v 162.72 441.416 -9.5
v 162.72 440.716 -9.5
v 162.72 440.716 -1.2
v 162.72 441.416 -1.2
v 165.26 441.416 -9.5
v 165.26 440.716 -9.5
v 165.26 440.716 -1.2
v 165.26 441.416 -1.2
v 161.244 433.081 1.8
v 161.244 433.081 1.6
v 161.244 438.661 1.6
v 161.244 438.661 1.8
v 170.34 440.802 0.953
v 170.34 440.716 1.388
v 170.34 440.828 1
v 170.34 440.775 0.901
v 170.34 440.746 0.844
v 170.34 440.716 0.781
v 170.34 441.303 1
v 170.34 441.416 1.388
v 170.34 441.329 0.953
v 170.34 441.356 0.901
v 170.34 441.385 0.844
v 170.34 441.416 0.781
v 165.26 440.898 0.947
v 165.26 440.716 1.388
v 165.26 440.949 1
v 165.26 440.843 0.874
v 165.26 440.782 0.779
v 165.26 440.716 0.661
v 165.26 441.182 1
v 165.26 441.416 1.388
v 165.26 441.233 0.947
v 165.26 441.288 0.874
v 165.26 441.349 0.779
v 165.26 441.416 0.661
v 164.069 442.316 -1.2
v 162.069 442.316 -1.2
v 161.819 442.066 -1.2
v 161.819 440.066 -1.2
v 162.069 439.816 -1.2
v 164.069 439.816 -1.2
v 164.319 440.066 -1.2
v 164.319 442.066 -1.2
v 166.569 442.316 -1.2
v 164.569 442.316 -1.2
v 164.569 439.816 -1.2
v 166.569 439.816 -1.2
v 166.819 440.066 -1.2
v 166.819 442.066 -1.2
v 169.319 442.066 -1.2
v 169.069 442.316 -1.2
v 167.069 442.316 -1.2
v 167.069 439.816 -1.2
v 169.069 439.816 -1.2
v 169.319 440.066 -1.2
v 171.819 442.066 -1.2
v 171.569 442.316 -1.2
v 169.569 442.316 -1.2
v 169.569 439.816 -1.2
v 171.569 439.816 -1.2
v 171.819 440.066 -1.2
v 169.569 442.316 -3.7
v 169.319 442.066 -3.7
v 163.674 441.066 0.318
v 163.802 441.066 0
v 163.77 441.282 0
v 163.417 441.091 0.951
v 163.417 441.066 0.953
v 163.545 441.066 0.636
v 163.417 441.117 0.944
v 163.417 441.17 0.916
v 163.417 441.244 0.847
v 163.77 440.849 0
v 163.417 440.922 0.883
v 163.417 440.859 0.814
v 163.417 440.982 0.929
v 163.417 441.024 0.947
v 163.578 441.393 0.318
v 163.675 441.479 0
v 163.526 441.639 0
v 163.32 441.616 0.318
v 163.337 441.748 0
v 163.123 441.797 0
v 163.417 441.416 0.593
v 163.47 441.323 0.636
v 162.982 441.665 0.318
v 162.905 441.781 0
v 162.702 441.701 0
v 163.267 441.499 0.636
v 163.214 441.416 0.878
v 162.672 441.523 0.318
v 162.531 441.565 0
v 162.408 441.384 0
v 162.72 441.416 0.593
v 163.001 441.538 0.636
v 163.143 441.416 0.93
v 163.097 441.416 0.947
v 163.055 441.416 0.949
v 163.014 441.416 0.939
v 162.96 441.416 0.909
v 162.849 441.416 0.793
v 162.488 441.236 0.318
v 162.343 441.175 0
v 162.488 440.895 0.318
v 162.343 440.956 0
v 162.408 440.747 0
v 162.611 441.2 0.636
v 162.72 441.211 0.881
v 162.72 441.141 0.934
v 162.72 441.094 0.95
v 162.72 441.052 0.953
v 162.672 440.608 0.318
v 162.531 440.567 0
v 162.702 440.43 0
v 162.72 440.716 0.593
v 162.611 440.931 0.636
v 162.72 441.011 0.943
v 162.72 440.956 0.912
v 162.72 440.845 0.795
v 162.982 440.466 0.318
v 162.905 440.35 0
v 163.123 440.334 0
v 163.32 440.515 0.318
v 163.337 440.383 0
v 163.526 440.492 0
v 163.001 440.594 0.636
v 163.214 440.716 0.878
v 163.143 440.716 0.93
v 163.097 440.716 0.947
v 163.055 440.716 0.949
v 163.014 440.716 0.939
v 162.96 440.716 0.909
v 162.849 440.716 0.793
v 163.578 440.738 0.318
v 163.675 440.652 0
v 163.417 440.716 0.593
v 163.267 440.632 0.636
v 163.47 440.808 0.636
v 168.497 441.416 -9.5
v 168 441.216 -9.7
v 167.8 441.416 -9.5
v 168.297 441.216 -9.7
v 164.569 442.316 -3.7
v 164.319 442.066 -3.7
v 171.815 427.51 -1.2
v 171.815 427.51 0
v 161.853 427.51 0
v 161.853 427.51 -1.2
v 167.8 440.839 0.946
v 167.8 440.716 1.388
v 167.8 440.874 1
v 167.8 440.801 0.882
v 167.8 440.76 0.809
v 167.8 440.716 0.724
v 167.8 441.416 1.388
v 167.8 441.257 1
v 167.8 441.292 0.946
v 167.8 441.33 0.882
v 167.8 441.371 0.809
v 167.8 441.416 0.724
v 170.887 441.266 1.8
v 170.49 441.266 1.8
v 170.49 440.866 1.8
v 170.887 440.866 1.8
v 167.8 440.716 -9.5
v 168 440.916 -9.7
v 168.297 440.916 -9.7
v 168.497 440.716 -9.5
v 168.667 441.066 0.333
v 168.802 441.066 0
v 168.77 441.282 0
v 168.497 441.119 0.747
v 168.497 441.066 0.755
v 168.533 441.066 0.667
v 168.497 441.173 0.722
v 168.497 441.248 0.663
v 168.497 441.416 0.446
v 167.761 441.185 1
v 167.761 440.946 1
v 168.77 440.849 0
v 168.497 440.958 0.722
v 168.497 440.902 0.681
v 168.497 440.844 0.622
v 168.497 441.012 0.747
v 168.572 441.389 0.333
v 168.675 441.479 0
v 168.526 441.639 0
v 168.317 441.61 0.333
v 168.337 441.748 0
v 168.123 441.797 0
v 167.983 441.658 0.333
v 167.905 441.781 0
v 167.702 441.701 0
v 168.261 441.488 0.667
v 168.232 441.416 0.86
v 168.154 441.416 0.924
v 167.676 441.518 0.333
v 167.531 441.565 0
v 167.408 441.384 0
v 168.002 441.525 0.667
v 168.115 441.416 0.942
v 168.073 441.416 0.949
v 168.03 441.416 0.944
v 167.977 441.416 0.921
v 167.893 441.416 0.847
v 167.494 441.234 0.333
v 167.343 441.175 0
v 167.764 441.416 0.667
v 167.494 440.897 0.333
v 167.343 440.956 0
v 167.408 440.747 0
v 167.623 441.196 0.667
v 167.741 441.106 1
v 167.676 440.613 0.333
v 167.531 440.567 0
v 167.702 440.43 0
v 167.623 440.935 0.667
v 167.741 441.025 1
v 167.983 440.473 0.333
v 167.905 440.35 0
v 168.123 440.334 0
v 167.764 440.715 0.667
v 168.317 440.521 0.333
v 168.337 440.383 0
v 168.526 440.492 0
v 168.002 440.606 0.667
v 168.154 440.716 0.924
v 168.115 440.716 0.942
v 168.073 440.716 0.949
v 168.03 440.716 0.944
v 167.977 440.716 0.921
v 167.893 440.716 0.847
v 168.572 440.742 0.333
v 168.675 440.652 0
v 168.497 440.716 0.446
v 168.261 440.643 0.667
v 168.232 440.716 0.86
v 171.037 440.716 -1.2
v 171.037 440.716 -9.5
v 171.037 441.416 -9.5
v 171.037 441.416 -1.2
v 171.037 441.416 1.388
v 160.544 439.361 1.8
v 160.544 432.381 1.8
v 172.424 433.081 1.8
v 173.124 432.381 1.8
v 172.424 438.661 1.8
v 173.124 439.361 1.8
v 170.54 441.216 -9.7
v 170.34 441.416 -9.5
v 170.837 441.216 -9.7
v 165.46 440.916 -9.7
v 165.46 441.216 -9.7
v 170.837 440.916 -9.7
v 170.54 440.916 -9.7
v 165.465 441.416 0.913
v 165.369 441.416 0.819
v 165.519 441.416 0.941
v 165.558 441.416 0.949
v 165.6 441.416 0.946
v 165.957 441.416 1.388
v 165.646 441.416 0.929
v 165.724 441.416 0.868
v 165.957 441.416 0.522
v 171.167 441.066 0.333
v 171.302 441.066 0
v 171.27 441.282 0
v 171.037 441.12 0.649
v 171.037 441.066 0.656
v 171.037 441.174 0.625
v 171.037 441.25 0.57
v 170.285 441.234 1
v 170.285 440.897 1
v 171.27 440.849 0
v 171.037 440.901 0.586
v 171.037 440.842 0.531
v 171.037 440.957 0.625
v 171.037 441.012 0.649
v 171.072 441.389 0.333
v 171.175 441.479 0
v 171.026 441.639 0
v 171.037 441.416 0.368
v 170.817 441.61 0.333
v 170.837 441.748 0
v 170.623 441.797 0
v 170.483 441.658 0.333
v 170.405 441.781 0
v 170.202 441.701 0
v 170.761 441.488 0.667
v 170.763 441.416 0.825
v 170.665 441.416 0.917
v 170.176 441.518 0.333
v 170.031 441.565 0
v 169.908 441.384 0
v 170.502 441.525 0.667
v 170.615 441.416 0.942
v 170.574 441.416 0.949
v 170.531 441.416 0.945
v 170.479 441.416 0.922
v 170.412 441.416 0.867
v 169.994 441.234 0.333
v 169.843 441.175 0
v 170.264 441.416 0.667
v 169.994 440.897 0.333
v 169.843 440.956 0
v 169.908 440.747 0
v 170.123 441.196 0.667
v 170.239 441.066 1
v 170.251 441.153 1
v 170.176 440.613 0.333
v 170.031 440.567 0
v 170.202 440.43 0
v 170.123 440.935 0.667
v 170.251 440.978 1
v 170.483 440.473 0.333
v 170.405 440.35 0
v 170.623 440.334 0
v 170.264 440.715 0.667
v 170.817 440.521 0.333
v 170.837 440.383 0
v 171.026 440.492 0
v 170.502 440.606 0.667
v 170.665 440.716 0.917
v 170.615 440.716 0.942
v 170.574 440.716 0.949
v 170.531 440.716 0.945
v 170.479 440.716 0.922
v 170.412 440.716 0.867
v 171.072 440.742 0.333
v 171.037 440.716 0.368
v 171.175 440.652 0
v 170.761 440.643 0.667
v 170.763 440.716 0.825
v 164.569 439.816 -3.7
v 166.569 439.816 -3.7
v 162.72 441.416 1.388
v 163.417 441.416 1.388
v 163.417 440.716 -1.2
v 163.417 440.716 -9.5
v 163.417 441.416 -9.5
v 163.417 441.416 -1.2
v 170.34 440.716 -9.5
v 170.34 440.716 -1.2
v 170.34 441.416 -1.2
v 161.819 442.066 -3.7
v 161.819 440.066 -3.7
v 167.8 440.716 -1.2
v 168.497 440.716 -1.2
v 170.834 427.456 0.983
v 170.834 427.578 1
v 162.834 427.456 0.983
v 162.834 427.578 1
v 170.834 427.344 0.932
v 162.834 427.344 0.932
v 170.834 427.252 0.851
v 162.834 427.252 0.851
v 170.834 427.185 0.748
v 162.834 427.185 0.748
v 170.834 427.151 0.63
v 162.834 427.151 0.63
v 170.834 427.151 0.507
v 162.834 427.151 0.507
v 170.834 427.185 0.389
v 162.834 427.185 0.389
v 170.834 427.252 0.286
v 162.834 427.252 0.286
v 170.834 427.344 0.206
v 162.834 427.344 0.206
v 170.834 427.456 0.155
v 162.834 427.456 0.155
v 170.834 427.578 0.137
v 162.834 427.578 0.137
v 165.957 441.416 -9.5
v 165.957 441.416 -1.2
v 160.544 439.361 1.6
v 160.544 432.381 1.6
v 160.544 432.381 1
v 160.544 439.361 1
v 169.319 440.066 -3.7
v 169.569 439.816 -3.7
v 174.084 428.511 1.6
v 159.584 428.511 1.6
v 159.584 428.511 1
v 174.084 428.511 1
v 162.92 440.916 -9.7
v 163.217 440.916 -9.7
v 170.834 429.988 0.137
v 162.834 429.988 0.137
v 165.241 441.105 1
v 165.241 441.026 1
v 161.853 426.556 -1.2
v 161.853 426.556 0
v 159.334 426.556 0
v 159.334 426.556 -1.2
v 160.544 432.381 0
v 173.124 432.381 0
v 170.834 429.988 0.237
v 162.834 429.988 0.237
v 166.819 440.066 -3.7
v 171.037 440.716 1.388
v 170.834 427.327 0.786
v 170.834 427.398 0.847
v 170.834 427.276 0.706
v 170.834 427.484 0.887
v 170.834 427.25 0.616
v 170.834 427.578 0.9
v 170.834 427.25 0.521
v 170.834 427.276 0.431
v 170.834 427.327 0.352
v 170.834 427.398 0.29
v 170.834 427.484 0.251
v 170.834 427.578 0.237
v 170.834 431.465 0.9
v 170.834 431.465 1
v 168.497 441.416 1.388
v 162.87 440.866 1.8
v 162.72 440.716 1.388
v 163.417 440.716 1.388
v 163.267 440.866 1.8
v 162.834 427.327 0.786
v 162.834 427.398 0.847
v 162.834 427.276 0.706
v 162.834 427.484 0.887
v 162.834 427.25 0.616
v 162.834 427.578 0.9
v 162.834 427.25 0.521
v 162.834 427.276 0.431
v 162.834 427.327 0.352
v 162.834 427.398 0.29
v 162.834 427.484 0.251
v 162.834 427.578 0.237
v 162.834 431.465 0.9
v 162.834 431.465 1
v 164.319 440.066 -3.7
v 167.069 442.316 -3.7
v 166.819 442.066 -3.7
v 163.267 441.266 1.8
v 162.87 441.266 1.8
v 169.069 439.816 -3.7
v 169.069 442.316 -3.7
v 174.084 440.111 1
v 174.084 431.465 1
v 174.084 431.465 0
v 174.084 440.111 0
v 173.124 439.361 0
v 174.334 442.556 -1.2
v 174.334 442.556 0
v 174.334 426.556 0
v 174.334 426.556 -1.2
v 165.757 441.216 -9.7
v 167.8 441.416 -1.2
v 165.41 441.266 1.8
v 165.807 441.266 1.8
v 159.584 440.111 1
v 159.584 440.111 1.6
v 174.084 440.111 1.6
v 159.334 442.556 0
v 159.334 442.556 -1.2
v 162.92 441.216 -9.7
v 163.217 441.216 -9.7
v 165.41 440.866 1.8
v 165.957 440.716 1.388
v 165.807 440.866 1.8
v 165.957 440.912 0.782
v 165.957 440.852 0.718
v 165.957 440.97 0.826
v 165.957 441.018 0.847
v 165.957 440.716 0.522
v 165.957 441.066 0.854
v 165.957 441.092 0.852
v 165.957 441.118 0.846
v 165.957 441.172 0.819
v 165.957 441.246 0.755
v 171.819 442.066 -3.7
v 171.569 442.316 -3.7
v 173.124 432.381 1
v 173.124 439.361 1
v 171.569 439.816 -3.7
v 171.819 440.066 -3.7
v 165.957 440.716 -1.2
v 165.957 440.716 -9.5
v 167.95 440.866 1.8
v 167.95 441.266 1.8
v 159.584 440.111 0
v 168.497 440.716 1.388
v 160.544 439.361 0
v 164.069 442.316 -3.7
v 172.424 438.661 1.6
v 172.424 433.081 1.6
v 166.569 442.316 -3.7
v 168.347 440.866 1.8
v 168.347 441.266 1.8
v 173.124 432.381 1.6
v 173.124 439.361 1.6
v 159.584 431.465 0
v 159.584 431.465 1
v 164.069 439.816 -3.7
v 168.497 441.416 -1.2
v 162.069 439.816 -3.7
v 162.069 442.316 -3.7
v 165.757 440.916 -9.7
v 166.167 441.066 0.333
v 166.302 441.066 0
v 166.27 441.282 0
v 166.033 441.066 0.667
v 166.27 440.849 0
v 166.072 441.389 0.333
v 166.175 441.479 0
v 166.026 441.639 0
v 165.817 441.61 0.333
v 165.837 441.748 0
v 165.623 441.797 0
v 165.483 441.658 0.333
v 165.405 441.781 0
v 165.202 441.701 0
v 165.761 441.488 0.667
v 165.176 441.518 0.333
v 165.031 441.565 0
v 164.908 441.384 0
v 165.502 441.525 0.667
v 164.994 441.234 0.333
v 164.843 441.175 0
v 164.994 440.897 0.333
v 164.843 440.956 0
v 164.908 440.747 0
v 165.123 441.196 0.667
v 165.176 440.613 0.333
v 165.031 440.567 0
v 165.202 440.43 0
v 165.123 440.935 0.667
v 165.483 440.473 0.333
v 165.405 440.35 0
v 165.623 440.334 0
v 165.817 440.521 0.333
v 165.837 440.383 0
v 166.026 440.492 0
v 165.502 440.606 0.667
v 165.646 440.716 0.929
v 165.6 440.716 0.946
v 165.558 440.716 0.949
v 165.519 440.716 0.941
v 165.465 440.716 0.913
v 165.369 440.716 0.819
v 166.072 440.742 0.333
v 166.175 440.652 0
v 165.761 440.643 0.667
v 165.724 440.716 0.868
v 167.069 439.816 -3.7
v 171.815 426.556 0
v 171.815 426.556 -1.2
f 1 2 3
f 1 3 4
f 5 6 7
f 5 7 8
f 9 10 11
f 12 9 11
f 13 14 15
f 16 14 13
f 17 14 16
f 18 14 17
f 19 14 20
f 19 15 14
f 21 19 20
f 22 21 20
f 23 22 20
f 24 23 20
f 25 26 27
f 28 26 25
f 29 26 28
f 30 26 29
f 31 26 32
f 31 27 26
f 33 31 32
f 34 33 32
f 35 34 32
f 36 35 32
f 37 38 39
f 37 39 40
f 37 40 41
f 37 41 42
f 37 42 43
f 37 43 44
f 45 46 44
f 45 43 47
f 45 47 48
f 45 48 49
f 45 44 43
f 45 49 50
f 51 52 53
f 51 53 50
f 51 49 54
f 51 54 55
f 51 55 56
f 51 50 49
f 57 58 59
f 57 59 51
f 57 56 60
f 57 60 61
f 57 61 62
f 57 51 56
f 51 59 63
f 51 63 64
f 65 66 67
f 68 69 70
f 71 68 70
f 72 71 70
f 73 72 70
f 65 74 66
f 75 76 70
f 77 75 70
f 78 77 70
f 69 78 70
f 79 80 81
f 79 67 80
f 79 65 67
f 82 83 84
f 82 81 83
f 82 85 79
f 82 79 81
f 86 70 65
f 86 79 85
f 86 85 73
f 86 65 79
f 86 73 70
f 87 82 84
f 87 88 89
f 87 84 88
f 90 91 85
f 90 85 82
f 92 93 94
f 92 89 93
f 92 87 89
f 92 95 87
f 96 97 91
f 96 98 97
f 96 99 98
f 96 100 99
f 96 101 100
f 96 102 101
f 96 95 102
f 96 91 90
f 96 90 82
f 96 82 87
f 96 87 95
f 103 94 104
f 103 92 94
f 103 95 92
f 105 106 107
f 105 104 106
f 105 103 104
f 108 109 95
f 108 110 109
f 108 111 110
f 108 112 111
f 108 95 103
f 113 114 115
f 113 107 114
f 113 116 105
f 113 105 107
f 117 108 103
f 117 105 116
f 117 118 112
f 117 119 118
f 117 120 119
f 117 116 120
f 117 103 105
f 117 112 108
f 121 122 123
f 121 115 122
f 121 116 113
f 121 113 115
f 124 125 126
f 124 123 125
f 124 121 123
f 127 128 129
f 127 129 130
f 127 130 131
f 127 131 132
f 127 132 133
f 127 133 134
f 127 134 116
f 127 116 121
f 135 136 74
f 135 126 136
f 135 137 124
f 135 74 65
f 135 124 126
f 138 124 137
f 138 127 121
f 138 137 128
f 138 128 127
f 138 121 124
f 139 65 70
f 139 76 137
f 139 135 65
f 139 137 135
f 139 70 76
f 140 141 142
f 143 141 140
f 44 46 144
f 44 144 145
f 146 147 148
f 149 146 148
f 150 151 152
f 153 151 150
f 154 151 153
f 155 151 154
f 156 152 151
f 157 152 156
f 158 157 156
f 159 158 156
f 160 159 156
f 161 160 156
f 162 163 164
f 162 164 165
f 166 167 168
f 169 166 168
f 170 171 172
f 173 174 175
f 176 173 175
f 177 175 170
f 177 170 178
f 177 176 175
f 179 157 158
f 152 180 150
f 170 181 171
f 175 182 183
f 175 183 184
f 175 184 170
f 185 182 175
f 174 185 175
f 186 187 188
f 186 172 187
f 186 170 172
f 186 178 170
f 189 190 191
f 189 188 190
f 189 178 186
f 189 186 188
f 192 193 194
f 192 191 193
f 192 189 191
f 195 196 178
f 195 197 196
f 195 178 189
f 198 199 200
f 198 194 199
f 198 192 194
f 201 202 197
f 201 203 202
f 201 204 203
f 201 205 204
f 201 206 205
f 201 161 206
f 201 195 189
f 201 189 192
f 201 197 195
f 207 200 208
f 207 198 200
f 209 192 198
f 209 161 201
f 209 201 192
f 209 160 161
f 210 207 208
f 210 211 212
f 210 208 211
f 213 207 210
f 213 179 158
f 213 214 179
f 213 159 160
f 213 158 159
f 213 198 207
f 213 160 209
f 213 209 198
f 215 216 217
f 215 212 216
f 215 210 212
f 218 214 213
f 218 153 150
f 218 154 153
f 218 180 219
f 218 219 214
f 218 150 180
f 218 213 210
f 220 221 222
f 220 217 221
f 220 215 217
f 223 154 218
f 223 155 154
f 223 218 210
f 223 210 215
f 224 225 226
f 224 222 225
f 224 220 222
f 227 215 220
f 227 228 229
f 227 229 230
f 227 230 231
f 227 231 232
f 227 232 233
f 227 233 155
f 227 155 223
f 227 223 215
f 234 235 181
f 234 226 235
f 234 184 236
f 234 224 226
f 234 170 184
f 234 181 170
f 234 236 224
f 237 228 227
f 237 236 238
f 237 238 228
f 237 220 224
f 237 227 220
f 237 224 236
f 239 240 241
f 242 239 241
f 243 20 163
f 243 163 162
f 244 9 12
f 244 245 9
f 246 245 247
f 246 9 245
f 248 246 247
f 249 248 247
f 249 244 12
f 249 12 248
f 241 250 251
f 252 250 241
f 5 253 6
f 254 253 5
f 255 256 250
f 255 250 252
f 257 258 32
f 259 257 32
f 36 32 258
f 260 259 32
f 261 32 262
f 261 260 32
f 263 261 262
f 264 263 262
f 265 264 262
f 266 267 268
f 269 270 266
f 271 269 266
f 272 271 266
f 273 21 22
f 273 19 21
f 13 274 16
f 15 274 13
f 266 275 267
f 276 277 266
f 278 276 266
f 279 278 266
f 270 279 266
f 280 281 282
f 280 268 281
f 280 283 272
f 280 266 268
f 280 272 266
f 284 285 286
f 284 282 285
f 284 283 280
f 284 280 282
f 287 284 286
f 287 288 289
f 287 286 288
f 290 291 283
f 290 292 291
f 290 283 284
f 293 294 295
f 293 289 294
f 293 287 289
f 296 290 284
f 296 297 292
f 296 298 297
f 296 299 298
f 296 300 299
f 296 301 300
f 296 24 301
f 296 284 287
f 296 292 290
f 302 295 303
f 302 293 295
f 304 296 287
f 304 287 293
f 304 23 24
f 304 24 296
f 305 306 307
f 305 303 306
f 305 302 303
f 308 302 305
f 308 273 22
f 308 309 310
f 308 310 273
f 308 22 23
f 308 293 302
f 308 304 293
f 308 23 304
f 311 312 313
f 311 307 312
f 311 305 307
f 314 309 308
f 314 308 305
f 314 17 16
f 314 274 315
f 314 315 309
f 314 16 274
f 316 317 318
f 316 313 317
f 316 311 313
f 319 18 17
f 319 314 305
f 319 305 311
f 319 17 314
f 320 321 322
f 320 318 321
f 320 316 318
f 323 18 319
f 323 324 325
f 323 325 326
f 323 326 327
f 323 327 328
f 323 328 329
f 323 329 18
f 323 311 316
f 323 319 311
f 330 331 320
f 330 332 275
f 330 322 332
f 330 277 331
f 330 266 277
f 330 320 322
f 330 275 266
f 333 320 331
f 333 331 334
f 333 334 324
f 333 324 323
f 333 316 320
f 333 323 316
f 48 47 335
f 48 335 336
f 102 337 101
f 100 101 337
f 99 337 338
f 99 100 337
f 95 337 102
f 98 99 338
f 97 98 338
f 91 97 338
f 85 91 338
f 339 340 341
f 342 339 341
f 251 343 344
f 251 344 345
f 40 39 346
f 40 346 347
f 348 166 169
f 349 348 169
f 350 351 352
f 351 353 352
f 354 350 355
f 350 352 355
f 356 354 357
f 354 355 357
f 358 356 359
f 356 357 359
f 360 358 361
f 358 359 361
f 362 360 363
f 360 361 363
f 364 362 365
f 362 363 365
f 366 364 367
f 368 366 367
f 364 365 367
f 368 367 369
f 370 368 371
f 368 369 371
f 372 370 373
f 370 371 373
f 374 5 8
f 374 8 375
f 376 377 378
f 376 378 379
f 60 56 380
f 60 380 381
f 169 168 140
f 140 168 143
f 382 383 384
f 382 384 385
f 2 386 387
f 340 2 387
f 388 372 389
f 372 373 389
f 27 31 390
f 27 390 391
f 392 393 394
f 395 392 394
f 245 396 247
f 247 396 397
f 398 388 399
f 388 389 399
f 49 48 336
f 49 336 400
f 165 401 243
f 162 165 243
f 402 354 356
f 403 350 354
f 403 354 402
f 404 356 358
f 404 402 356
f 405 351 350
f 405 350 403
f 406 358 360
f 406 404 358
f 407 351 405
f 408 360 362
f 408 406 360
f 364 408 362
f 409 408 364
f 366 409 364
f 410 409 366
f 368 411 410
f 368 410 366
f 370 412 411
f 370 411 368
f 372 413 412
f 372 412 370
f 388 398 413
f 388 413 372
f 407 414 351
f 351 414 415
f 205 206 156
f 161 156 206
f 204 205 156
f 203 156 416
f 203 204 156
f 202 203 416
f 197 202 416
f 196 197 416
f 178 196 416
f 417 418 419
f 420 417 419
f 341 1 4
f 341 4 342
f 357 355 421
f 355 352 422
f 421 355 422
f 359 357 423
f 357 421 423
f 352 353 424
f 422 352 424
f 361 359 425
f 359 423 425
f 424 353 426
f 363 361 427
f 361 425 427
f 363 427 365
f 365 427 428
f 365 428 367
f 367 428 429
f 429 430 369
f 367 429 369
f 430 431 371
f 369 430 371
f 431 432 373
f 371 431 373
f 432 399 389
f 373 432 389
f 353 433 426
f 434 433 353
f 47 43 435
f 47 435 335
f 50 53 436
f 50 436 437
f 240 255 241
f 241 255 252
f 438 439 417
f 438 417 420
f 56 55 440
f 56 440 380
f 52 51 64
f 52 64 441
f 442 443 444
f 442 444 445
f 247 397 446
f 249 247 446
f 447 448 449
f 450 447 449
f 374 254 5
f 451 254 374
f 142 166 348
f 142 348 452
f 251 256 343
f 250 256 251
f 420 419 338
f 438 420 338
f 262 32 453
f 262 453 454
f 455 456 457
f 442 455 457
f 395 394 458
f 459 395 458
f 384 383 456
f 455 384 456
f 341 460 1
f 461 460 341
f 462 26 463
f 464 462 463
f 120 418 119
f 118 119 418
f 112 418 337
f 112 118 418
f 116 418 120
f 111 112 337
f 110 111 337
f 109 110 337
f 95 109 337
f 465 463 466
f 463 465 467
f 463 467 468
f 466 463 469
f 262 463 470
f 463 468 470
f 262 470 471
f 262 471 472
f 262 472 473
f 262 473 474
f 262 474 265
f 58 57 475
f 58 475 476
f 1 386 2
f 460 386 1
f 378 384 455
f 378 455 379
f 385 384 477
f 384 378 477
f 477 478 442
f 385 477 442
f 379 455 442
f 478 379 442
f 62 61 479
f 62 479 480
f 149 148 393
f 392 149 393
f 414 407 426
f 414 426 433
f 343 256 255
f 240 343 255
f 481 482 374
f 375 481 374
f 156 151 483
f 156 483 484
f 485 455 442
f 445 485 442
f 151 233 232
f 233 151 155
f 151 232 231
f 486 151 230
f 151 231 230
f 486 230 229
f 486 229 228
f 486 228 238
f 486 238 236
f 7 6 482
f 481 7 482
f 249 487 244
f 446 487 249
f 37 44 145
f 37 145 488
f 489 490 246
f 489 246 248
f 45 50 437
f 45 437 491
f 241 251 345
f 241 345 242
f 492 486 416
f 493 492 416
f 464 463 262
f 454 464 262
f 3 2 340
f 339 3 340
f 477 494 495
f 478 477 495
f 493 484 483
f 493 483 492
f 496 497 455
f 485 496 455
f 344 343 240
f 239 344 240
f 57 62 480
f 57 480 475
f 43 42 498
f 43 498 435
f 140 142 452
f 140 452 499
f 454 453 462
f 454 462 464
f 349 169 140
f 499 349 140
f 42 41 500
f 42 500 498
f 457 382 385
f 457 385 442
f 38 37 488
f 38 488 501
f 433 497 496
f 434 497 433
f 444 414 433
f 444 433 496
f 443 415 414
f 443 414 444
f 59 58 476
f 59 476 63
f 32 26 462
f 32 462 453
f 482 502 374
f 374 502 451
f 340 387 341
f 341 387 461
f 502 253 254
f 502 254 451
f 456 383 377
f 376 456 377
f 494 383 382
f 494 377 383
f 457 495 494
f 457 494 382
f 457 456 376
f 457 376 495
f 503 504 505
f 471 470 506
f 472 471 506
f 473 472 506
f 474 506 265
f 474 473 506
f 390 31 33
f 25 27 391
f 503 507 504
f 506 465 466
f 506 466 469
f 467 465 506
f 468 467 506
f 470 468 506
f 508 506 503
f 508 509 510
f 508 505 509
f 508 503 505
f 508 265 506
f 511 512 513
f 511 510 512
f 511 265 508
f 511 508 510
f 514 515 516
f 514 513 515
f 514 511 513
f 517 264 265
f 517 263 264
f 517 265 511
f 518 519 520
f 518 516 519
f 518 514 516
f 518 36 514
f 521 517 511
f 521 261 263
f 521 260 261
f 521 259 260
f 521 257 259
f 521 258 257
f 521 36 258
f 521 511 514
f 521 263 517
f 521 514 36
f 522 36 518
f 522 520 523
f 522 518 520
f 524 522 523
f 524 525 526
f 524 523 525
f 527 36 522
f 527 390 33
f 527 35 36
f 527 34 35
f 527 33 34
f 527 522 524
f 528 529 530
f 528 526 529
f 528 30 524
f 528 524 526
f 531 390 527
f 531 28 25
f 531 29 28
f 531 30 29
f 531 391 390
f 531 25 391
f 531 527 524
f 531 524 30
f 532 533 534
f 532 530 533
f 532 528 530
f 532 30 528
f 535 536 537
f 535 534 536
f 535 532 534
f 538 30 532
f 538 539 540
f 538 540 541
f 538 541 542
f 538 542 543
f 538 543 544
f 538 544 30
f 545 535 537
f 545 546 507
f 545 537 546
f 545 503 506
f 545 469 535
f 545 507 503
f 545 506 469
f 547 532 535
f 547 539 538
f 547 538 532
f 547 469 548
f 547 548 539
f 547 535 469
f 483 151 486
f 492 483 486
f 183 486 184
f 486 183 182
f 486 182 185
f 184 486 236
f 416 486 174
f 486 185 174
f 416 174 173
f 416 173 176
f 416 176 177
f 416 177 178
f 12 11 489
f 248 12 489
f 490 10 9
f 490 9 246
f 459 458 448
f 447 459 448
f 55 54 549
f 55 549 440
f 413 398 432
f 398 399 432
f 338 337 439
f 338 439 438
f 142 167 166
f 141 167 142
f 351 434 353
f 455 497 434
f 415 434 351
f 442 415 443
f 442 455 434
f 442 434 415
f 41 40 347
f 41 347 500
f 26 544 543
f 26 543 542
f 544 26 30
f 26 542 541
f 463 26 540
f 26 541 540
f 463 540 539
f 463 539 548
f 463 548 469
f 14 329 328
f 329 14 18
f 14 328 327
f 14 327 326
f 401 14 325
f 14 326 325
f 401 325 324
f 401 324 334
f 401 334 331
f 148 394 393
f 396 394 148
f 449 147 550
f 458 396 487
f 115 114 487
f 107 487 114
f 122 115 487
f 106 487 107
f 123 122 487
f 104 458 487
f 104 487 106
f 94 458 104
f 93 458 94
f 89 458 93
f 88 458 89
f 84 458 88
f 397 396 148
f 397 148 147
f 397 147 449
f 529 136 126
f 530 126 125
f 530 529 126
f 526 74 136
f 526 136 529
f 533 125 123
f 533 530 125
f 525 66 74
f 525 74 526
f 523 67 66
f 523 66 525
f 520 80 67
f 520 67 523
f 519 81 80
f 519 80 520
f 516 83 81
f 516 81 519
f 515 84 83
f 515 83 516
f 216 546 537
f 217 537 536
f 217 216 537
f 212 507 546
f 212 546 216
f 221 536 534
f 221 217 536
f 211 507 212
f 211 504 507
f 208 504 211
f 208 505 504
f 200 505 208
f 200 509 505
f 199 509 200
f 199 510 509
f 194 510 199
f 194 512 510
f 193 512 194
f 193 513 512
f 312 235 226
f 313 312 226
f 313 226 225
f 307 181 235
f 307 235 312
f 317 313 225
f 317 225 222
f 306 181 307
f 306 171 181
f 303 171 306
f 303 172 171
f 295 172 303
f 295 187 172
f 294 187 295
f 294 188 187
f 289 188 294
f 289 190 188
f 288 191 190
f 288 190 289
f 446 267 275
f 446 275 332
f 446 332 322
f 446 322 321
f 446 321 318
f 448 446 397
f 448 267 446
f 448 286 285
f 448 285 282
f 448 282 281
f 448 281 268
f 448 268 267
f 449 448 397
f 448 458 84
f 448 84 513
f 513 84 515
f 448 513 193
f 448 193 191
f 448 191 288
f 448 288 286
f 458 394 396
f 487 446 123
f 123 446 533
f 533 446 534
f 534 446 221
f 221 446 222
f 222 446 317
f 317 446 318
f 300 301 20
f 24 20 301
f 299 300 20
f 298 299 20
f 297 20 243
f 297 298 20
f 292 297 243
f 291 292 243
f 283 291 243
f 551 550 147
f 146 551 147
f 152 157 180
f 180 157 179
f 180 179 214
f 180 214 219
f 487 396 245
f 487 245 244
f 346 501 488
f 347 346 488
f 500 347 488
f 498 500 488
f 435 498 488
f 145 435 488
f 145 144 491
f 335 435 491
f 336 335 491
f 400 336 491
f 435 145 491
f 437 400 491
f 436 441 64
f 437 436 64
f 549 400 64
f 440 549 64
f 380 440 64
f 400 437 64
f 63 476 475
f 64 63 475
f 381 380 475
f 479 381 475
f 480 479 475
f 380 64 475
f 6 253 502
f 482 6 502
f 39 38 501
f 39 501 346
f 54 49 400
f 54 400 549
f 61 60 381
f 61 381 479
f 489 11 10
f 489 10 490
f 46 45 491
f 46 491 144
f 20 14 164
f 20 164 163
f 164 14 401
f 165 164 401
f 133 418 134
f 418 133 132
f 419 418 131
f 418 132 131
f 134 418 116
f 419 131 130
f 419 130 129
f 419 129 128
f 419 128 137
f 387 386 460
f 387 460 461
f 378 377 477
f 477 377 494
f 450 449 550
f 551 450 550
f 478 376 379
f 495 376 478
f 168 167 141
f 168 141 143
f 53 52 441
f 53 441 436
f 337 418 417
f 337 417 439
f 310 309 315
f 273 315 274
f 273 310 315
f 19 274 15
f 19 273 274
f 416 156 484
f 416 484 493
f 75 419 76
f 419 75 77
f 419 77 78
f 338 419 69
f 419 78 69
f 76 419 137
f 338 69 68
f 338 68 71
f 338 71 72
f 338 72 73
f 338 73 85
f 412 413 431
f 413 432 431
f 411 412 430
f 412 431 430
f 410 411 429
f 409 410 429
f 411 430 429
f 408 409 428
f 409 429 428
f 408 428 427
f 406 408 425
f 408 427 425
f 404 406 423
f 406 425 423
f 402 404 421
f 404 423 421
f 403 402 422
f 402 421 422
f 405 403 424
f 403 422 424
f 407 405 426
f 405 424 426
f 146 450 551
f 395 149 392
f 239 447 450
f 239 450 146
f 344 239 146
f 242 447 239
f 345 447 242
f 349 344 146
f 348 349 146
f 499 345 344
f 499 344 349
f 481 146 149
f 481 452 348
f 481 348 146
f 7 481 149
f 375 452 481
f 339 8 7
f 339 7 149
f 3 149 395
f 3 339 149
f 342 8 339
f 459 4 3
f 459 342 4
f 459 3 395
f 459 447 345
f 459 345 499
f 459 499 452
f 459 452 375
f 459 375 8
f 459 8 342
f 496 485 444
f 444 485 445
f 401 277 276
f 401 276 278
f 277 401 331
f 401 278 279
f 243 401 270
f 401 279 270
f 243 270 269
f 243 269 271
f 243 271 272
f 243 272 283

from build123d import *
from OCP.BRepFilletAPI import BRepFilletAPI_MakeChamfer

# Parameters (mm, degrees)
SKETCH1_W                = 14.5
SKETCH1_H                = 11.6
SKETCH1_W_2              = 0.696922127
SKETCH1_H_2              = 0.7
SKETCH1_W_3              = 12.58
SKETCH1_H_3              = 6.98
SKETCH1_W_4              = 11.18
SKETCH1_H_4              = 5.58
BOSS_EXTRUDE1_DEPTH      = 1.2
BOSS_EXTRUDE2_DEPTH      = 1.8
BOSS_EXTRUDE2_DEPTH_BACK = 9.7
SKETCH1_3_W              = 0.696922127
SKETCH1_3_H              = 0.7
BOSS_EXTRUDE3_START      = 1.6
SKETCH1_4_W              = 14.5
SKETCH1_4_H              = 11.6
SKETCH1_4_W_2            = 12.58
SKETCH1_4_H_2            = 6.98
BOSS_EXTRUDE3_DEPTH      = 0.6
SKETCH1_5_W              = 12.58
SKETCH1_5_H              = 6.98
SKETCH1_5_W_2            = 11.18
SKETCH1_5_H_2            = 5.58
BOSS_EXTRUDE4_DEPTH      = 1.8
SKETCH1_6_W              = 11.18
SKETCH1_6_H              = 5.58
BOSS_EXTRUDE5_DEPTH      = 1.6
BOSS_EXTRUDE6_DEPTH      = 2.5
LPATTERN1_COUNT          = 4
LPATTERN1_PITCH          = 2.5
BOSS_EXTRUDE7_START      = -0.6
SKETCH3_W                = 14.5
SKETCH3_H                = 8.64585792
BOSS_EXTRUDE7_DEPTH      = 1
SKETCH4_R                = 0.733632711
BOSS_EXTRUDE8_DEPTH      = 1
BOSS_EXTRUDE8_TAPER      = 22
LPATTERN2_COUNT          = 4
LPATTERN2_PITCH          = 2.5
EXTRUDE_THIN1_DEPTH      = 4
CHAMFER1_SIZE            = 0.15
CHAMFER1_SIZE2           = 0.412121613
CHAMFER2_SIZE            = 0.15
CHAMFER2_SIZE2           = 0.412121613
CHAMFER3_SIZE            = 0.2


with BuildPart() as part:
    # Sketch1 → Boss-Extrude1 (new body)
    # profile 1 of 4: a face of its own
    with BuildSketch(Plane.XY):
        Polygon((171.814961943, 426.555570658), (171.814961943, 427.510394392), (161.853237798, 427.510394392), (161.853237798, 426.555570658), (159.33409987, 426.555570658), (159.33409987, 442.555570658), (174.33409987, 442.555570658), (174.33409987, 426.555570658), align=None)
        with Locations((166.83409987, 434.311004349)):
            Rectangle(SKETCH1_W, SKETCH1_H, mode=Mode.SUBTRACT)
        with Locations((163.068503678, 441.065562707)):
            Rectangle(SKETCH1_W_2, SKETCH1_H_2, mode=Mode.SUBTRACT)
        with Locations((165.608503678, 441.065562707)):
            Rectangle(SKETCH1_W_2, SKETCH1_H_2, mode=Mode.SUBTRACT)
        with Locations((168.148503678, 441.065562707)):
            Rectangle(SKETCH1_W_2, SKETCH1_H_2, mode=Mode.SUBTRACT)
        with Locations((170.688503678, 441.065562707)):
            Rectangle(SKETCH1_W_2, SKETCH1_H_2, mode=Mode.SUBTRACT)
    # profile 2 of 4: a face of its own
    with BuildSketch(Plane.XY):
        with Locations((166.83409987, 434.311004349)):
            Rectangle(SKETCH1_W, SKETCH1_H)
        with Locations((166.83409987, 435.871314227)):
            Rectangle(SKETCH1_W_3, SKETCH1_H_3, mode=Mode.SUBTRACT)
    # profile 3 of 4: a face of its own
    with BuildSketch(Plane.XY):
        with Locations((166.83409987, 435.871314227)):
            Rectangle(SKETCH1_W_3, SKETCH1_H_3)
        with Locations((166.83409987, 435.871314227)):
            Rectangle(SKETCH1_W_4, SKETCH1_H_4, mode=Mode.SUBTRACT)
    # profile 4 of 4: a face of its own
    with BuildSketch(Plane.XY):
        with Locations((166.83409987, 435.871314227)):
            Rectangle(SKETCH1_W_4, SKETCH1_H_4)
    extrude(amount=-BOSS_EXTRUDE1_DEPTH)

    # Sketch1<3> → Boss-Extrude2 (add, two sides: drawn at the far end of the back side and taken through both)
    with BuildSketch(Plane.XY.offset(-BOSS_EXTRUDE2_DEPTH_BACK)):
        with Locations((163.068503678, 441.065562707)):
            Rectangle(SKETCH1_3_W, SKETCH1_3_H)
        with Locations((165.608503678, 441.065562707)):
            Rectangle(SKETCH1_3_W, SKETCH1_3_H)
        with Locations((168.148503678, 441.065562707)):
            Rectangle(SKETCH1_3_W, SKETCH1_3_H)
        with Locations((170.688503678, 441.065562707)):
            Rectangle(SKETCH1_3_W, SKETCH1_3_H)
    extrude(amount=BOSS_EXTRUDE2_DEPTH + BOSS_EXTRUDE2_DEPTH_BACK)

    # Sketch1<5> → Boss-Extrude4 (add)
    with BuildSketch(Plane.XY):
        with Locations((166.83409987, 435.871314227)):
            Rectangle(SKETCH1_5_W, SKETCH1_5_H)
        with Locations((166.83409987, 435.871314227)):
            Rectangle(SKETCH1_5_W_2, SKETCH1_5_H_2, mode=Mode.SUBTRACT)
    extrude(amount=BOSS_EXTRUDE4_DEPTH)

    # Sketch1<6> → Boss-Extrude5 (add)
    with BuildSketch(Plane.XY):
        with Locations((166.83409987, 435.871314227)):
            Rectangle(SKETCH1_6_W, SKETCH1_6_H)
    extrude(amount=BOSS_EXTRUDE5_DEPTH)


with BuildPart() as body_2:
    # Sketch1<4> → Boss-Extrude3 (new body)
    with BuildSketch(Plane.XY.offset(BOSS_EXTRUDE3_START)):
        with Locations((166.83409987, 434.311004349)):
            Rectangle(SKETCH1_4_W, SKETCH1_4_H)
        with Locations((166.83409987, 435.871314227)):
            Rectangle(SKETCH1_4_W_2, SKETCH1_4_H_2, mode=Mode.SUBTRACT)
    extrude(amount=-BOSS_EXTRUDE3_DEPTH)


with BuildPart() as body_3:
    # Sketch2 → Boss-Extrude6 (new body)
    with BuildSketch(Plane(origin=(0, 0, -1.2), x_dir=(-1, 0, 0), z_dir=(0, 0, -1))):
        Polygon((-164.068503677, 442.315562707), (-162.068503677, 442.315562707), (-161.818503677, 442.065562707), (-161.818503677, 440.065562707), (-162.068503677, 439.815562707), (-164.068503677, 439.815562707), (-164.318503677, 440.065562707), (-164.318503677, 442.065562707), align=None)
    boss_extrude6 = extrude(amount=BOSS_EXTRUDE6_DEPTH)


with BuildPart() as lpattern1_1:
    # LPattern1: pattern copy
    add(boss_extrude6.moved(Location(Vector(1, 0, 0) * (1 * LPATTERN1_PITCH))))


with BuildPart() as lpattern1_2:
    # LPattern1: pattern copy
    add(boss_extrude6.moved(Location(Vector(1, 0, 0) * (2 * LPATTERN1_PITCH))))


with BuildPart() as lpattern1_3:
    # LPattern1: pattern copy
    add(boss_extrude6.moved(Location(Vector(1, 0, 0) * (3 * LPATTERN1_PITCH))))


with BuildPart() as body_7:
    # Sketch3 → Boss-Extrude7 (new body)
    with BuildSketch(Plane.XY.offset(1.6).offset(BOSS_EXTRUDE7_START)):
        with Locations((166.83409987, 435.788075389)):
            Rectangle(SKETCH3_W, SKETCH3_H)
    extrude(amount=-BOSS_EXTRUDE7_DEPTH)

    # Sketch6 → Extrude-Thin1 (add, symmetric)
    with BuildSketch(Plane.ZY.offset(-166.83409987)):
        with BuildLine():
            Line((1, 434.311004349), (1, 427.577640227))
            ThreePointArc((1, 427.577640227), (0.568569371, 427.146209598), (0.137138742, 427.577640227))
            Line((0.137138742, 427.577640227), (0.137138742, 429.988075389))
            Line((0.137138742, 429.988075389), (0.237138742, 429.988075389))
            Line((0.237138742, 429.988075389), (0.237138742, 427.577640227))
            ThreePointArc((0.237138742, 427.577640227), (0.568569371, 427.246209598), (0.9, 427.577640227))
            Line((0.9, 427.577640227), (0.9, 434.311004349))
            Line((0.9, 434.311004349), (1, 434.311004349))
        make_face()
    extrude(amount=EXTRUDE_THIN1_DEPTH, both=True)


with BuildPart() as body_8:
    # Sketch4 → Boss-Extrude8 (new body)
    with BuildSketch(Plane.XY):
        with Locations((163.068503677, 441.065562707)):
            Circle(SKETCH4_R)
    boss_extrude8 = extrude(amount=BOSS_EXTRUDE8_DEPTH, taper=BOSS_EXTRUDE8_TAPER)


with BuildPart() as lpattern2_1:
    # LPattern2: pattern copy
    add(boss_extrude8.moved(Location(Vector(1, 0, 0) * (1 * LPATTERN2_PITCH))))


with BuildPart() as lpattern2_2:
    # LPattern2: pattern copy
    add(boss_extrude8.moved(Location(Vector(1, 0, 0) * (2 * LPATTERN2_PITCH))))


with BuildPart() as lpattern2_3:
    # LPattern2: pattern copy
    add(boss_extrude8.moved(Location(Vector(1, 0, 0) * (3 * LPATTERN2_PITCH))))


with BuildPart() as part_1:
    add(part.part)

    # Combine2: union LPattern2_3, LPattern2_2, LPattern2_1, body 8
    add(lpattern2_3.part)
    add(lpattern2_2.part)
    add(lpattern2_1.part)
    add(body_8.part)

    # Chamfer1
    chamfer1_edges = [part_1.edges().sort_by_distance(p)[0] for p in [
        (171.036964741, 441.065562707, 1.8),
        (170.688503677, 441.415562707, 1.8),
        (170.340042614, 441.065562707, 1.8),
        (170.688503677, 440.715562707, 1.8),
    ]]
    chamfer1_side = [part_1.faces().sort_by_distance(p)[0] for p in [
        (170.688503677, 441.065562707, 1.8),
    ]]
    chamfer(chamfer1_edges, length=CHAMFER1_SIZE, length2=CHAMFER1_SIZE2, reference=chamfer1_side[0])

    # Chamfer2: one chamfer whose edges measure the first distance from different faces: ONE call of the kernel's chamfer builder (chamfer() names one face for all edges)
    chamfer2_edges_1 = [part_1.edges().sort_by_distance(p)[0] for p in [
        (168.496964741, 441.065562707, 1.8),
        (168.148503677, 441.415562707, 1.8),
        (167.800042614, 441.065562707, 1.8),
        (168.148503677, 440.715562707, 1.8),
    ]]
    chamfer2_side_1 = [part_1.faces().sort_by_distance(p)[0] for p in [
        (168.148503677, 441.065562707, 1.8),
    ]]
    chamfer2_edges_2 = [part_1.edges().sort_by_distance(p)[0] for p in [
        (163.416964741, 441.065562707, 1.8),
        (163.068503677, 441.415562707, 1.8),
        (162.720042614, 441.065562707, 1.8),
        (163.068503677, 440.715562707, 1.8),
    ]]
    chamfer2_side_2 = [part_1.faces().sort_by_distance(p)[0] for p in [
        (163.068503677, 441.065562707, 1.8),
    ]]
    chamfer2_edges_3 = [part_1.edges().sort_by_distance(p)[0] for p in [
        (165.956964741, 441.065562707, 1.8),
        (165.608503677, 441.415562707, 1.8),
        (165.260042614, 441.065562707, 1.8),
        (165.608503677, 440.715562707, 1.8),
    ]]
    chamfer2_side_3 = [part_1.faces().sort_by_distance(p)[0] for p in [
        (165.608503677, 441.065562707, 1.8),
    ]]
    chamfer2 = BRepFilletAPI_MakeChamfer(part_1.part.solid().wrapped)
    for e in chamfer2_edges_1:
        chamfer2.Add(CHAMFER2_SIZE, CHAMFER2_SIZE2, e.wrapped, chamfer2_side_1[0].wrapped)  # the first distance lies on this face
    for e in chamfer2_edges_2:
        chamfer2.Add(CHAMFER2_SIZE, CHAMFER2_SIZE2, e.wrapped, chamfer2_side_2[0].wrapped)  # the first distance lies on this face
    for e in chamfer2_edges_3:
        chamfer2.Add(CHAMFER2_SIZE, CHAMFER2_SIZE2, e.wrapped, chamfer2_side_3[0].wrapped)  # the first distance lies on this face
    add(Compound.cast(chamfer2.Shape()), mode=Mode.REPLACE)

    # Chamfer3
    chamfer3_edges = [part_1.edges().sort_by_distance(p)[0] for p in [
        (168.148503677, 440.715562707, -9.7),
        (167.800042614, 441.065562707, -9.7),
        (168.496964741, 441.065562707, -9.7),
        (168.148503677, 441.415562707, -9.7),
        (170.688503677, 440.715562707, -9.7),
        (170.340042614, 441.065562707, -9.7),
        (171.036964741, 441.065562707, -9.7),
        (170.688503677, 441.415562707, -9.7),
        (163.068503677, 440.715562707, -9.7),
        (162.720042614, 441.065562707, -9.7),
        (163.416964741, 441.065562707, -9.7),
        (163.068503677, 441.415562707, -9.7),
        (165.608503677, 440.715562707, -9.7),
        (165.260042614, 441.065562707, -9.7),
        (165.956964741, 441.065562707, -9.7),
        (165.608503677, 441.415562707, -9.7),
    ]]
    chamfer(chamfer3_edges, length=CHAMFER3_SIZE)


with BuildPart() as body_3_1:
    add(body_3.part)

    # Combine3: union LPattern1_1, LPattern1_2, LPattern1_3
    add(lpattern1_1.part)
    add(lpattern1_2.part)
    add(lpattern1_3.part)


solid = Compound([body_2.part, body_7.part, part_1.part, body_3_1.part])
